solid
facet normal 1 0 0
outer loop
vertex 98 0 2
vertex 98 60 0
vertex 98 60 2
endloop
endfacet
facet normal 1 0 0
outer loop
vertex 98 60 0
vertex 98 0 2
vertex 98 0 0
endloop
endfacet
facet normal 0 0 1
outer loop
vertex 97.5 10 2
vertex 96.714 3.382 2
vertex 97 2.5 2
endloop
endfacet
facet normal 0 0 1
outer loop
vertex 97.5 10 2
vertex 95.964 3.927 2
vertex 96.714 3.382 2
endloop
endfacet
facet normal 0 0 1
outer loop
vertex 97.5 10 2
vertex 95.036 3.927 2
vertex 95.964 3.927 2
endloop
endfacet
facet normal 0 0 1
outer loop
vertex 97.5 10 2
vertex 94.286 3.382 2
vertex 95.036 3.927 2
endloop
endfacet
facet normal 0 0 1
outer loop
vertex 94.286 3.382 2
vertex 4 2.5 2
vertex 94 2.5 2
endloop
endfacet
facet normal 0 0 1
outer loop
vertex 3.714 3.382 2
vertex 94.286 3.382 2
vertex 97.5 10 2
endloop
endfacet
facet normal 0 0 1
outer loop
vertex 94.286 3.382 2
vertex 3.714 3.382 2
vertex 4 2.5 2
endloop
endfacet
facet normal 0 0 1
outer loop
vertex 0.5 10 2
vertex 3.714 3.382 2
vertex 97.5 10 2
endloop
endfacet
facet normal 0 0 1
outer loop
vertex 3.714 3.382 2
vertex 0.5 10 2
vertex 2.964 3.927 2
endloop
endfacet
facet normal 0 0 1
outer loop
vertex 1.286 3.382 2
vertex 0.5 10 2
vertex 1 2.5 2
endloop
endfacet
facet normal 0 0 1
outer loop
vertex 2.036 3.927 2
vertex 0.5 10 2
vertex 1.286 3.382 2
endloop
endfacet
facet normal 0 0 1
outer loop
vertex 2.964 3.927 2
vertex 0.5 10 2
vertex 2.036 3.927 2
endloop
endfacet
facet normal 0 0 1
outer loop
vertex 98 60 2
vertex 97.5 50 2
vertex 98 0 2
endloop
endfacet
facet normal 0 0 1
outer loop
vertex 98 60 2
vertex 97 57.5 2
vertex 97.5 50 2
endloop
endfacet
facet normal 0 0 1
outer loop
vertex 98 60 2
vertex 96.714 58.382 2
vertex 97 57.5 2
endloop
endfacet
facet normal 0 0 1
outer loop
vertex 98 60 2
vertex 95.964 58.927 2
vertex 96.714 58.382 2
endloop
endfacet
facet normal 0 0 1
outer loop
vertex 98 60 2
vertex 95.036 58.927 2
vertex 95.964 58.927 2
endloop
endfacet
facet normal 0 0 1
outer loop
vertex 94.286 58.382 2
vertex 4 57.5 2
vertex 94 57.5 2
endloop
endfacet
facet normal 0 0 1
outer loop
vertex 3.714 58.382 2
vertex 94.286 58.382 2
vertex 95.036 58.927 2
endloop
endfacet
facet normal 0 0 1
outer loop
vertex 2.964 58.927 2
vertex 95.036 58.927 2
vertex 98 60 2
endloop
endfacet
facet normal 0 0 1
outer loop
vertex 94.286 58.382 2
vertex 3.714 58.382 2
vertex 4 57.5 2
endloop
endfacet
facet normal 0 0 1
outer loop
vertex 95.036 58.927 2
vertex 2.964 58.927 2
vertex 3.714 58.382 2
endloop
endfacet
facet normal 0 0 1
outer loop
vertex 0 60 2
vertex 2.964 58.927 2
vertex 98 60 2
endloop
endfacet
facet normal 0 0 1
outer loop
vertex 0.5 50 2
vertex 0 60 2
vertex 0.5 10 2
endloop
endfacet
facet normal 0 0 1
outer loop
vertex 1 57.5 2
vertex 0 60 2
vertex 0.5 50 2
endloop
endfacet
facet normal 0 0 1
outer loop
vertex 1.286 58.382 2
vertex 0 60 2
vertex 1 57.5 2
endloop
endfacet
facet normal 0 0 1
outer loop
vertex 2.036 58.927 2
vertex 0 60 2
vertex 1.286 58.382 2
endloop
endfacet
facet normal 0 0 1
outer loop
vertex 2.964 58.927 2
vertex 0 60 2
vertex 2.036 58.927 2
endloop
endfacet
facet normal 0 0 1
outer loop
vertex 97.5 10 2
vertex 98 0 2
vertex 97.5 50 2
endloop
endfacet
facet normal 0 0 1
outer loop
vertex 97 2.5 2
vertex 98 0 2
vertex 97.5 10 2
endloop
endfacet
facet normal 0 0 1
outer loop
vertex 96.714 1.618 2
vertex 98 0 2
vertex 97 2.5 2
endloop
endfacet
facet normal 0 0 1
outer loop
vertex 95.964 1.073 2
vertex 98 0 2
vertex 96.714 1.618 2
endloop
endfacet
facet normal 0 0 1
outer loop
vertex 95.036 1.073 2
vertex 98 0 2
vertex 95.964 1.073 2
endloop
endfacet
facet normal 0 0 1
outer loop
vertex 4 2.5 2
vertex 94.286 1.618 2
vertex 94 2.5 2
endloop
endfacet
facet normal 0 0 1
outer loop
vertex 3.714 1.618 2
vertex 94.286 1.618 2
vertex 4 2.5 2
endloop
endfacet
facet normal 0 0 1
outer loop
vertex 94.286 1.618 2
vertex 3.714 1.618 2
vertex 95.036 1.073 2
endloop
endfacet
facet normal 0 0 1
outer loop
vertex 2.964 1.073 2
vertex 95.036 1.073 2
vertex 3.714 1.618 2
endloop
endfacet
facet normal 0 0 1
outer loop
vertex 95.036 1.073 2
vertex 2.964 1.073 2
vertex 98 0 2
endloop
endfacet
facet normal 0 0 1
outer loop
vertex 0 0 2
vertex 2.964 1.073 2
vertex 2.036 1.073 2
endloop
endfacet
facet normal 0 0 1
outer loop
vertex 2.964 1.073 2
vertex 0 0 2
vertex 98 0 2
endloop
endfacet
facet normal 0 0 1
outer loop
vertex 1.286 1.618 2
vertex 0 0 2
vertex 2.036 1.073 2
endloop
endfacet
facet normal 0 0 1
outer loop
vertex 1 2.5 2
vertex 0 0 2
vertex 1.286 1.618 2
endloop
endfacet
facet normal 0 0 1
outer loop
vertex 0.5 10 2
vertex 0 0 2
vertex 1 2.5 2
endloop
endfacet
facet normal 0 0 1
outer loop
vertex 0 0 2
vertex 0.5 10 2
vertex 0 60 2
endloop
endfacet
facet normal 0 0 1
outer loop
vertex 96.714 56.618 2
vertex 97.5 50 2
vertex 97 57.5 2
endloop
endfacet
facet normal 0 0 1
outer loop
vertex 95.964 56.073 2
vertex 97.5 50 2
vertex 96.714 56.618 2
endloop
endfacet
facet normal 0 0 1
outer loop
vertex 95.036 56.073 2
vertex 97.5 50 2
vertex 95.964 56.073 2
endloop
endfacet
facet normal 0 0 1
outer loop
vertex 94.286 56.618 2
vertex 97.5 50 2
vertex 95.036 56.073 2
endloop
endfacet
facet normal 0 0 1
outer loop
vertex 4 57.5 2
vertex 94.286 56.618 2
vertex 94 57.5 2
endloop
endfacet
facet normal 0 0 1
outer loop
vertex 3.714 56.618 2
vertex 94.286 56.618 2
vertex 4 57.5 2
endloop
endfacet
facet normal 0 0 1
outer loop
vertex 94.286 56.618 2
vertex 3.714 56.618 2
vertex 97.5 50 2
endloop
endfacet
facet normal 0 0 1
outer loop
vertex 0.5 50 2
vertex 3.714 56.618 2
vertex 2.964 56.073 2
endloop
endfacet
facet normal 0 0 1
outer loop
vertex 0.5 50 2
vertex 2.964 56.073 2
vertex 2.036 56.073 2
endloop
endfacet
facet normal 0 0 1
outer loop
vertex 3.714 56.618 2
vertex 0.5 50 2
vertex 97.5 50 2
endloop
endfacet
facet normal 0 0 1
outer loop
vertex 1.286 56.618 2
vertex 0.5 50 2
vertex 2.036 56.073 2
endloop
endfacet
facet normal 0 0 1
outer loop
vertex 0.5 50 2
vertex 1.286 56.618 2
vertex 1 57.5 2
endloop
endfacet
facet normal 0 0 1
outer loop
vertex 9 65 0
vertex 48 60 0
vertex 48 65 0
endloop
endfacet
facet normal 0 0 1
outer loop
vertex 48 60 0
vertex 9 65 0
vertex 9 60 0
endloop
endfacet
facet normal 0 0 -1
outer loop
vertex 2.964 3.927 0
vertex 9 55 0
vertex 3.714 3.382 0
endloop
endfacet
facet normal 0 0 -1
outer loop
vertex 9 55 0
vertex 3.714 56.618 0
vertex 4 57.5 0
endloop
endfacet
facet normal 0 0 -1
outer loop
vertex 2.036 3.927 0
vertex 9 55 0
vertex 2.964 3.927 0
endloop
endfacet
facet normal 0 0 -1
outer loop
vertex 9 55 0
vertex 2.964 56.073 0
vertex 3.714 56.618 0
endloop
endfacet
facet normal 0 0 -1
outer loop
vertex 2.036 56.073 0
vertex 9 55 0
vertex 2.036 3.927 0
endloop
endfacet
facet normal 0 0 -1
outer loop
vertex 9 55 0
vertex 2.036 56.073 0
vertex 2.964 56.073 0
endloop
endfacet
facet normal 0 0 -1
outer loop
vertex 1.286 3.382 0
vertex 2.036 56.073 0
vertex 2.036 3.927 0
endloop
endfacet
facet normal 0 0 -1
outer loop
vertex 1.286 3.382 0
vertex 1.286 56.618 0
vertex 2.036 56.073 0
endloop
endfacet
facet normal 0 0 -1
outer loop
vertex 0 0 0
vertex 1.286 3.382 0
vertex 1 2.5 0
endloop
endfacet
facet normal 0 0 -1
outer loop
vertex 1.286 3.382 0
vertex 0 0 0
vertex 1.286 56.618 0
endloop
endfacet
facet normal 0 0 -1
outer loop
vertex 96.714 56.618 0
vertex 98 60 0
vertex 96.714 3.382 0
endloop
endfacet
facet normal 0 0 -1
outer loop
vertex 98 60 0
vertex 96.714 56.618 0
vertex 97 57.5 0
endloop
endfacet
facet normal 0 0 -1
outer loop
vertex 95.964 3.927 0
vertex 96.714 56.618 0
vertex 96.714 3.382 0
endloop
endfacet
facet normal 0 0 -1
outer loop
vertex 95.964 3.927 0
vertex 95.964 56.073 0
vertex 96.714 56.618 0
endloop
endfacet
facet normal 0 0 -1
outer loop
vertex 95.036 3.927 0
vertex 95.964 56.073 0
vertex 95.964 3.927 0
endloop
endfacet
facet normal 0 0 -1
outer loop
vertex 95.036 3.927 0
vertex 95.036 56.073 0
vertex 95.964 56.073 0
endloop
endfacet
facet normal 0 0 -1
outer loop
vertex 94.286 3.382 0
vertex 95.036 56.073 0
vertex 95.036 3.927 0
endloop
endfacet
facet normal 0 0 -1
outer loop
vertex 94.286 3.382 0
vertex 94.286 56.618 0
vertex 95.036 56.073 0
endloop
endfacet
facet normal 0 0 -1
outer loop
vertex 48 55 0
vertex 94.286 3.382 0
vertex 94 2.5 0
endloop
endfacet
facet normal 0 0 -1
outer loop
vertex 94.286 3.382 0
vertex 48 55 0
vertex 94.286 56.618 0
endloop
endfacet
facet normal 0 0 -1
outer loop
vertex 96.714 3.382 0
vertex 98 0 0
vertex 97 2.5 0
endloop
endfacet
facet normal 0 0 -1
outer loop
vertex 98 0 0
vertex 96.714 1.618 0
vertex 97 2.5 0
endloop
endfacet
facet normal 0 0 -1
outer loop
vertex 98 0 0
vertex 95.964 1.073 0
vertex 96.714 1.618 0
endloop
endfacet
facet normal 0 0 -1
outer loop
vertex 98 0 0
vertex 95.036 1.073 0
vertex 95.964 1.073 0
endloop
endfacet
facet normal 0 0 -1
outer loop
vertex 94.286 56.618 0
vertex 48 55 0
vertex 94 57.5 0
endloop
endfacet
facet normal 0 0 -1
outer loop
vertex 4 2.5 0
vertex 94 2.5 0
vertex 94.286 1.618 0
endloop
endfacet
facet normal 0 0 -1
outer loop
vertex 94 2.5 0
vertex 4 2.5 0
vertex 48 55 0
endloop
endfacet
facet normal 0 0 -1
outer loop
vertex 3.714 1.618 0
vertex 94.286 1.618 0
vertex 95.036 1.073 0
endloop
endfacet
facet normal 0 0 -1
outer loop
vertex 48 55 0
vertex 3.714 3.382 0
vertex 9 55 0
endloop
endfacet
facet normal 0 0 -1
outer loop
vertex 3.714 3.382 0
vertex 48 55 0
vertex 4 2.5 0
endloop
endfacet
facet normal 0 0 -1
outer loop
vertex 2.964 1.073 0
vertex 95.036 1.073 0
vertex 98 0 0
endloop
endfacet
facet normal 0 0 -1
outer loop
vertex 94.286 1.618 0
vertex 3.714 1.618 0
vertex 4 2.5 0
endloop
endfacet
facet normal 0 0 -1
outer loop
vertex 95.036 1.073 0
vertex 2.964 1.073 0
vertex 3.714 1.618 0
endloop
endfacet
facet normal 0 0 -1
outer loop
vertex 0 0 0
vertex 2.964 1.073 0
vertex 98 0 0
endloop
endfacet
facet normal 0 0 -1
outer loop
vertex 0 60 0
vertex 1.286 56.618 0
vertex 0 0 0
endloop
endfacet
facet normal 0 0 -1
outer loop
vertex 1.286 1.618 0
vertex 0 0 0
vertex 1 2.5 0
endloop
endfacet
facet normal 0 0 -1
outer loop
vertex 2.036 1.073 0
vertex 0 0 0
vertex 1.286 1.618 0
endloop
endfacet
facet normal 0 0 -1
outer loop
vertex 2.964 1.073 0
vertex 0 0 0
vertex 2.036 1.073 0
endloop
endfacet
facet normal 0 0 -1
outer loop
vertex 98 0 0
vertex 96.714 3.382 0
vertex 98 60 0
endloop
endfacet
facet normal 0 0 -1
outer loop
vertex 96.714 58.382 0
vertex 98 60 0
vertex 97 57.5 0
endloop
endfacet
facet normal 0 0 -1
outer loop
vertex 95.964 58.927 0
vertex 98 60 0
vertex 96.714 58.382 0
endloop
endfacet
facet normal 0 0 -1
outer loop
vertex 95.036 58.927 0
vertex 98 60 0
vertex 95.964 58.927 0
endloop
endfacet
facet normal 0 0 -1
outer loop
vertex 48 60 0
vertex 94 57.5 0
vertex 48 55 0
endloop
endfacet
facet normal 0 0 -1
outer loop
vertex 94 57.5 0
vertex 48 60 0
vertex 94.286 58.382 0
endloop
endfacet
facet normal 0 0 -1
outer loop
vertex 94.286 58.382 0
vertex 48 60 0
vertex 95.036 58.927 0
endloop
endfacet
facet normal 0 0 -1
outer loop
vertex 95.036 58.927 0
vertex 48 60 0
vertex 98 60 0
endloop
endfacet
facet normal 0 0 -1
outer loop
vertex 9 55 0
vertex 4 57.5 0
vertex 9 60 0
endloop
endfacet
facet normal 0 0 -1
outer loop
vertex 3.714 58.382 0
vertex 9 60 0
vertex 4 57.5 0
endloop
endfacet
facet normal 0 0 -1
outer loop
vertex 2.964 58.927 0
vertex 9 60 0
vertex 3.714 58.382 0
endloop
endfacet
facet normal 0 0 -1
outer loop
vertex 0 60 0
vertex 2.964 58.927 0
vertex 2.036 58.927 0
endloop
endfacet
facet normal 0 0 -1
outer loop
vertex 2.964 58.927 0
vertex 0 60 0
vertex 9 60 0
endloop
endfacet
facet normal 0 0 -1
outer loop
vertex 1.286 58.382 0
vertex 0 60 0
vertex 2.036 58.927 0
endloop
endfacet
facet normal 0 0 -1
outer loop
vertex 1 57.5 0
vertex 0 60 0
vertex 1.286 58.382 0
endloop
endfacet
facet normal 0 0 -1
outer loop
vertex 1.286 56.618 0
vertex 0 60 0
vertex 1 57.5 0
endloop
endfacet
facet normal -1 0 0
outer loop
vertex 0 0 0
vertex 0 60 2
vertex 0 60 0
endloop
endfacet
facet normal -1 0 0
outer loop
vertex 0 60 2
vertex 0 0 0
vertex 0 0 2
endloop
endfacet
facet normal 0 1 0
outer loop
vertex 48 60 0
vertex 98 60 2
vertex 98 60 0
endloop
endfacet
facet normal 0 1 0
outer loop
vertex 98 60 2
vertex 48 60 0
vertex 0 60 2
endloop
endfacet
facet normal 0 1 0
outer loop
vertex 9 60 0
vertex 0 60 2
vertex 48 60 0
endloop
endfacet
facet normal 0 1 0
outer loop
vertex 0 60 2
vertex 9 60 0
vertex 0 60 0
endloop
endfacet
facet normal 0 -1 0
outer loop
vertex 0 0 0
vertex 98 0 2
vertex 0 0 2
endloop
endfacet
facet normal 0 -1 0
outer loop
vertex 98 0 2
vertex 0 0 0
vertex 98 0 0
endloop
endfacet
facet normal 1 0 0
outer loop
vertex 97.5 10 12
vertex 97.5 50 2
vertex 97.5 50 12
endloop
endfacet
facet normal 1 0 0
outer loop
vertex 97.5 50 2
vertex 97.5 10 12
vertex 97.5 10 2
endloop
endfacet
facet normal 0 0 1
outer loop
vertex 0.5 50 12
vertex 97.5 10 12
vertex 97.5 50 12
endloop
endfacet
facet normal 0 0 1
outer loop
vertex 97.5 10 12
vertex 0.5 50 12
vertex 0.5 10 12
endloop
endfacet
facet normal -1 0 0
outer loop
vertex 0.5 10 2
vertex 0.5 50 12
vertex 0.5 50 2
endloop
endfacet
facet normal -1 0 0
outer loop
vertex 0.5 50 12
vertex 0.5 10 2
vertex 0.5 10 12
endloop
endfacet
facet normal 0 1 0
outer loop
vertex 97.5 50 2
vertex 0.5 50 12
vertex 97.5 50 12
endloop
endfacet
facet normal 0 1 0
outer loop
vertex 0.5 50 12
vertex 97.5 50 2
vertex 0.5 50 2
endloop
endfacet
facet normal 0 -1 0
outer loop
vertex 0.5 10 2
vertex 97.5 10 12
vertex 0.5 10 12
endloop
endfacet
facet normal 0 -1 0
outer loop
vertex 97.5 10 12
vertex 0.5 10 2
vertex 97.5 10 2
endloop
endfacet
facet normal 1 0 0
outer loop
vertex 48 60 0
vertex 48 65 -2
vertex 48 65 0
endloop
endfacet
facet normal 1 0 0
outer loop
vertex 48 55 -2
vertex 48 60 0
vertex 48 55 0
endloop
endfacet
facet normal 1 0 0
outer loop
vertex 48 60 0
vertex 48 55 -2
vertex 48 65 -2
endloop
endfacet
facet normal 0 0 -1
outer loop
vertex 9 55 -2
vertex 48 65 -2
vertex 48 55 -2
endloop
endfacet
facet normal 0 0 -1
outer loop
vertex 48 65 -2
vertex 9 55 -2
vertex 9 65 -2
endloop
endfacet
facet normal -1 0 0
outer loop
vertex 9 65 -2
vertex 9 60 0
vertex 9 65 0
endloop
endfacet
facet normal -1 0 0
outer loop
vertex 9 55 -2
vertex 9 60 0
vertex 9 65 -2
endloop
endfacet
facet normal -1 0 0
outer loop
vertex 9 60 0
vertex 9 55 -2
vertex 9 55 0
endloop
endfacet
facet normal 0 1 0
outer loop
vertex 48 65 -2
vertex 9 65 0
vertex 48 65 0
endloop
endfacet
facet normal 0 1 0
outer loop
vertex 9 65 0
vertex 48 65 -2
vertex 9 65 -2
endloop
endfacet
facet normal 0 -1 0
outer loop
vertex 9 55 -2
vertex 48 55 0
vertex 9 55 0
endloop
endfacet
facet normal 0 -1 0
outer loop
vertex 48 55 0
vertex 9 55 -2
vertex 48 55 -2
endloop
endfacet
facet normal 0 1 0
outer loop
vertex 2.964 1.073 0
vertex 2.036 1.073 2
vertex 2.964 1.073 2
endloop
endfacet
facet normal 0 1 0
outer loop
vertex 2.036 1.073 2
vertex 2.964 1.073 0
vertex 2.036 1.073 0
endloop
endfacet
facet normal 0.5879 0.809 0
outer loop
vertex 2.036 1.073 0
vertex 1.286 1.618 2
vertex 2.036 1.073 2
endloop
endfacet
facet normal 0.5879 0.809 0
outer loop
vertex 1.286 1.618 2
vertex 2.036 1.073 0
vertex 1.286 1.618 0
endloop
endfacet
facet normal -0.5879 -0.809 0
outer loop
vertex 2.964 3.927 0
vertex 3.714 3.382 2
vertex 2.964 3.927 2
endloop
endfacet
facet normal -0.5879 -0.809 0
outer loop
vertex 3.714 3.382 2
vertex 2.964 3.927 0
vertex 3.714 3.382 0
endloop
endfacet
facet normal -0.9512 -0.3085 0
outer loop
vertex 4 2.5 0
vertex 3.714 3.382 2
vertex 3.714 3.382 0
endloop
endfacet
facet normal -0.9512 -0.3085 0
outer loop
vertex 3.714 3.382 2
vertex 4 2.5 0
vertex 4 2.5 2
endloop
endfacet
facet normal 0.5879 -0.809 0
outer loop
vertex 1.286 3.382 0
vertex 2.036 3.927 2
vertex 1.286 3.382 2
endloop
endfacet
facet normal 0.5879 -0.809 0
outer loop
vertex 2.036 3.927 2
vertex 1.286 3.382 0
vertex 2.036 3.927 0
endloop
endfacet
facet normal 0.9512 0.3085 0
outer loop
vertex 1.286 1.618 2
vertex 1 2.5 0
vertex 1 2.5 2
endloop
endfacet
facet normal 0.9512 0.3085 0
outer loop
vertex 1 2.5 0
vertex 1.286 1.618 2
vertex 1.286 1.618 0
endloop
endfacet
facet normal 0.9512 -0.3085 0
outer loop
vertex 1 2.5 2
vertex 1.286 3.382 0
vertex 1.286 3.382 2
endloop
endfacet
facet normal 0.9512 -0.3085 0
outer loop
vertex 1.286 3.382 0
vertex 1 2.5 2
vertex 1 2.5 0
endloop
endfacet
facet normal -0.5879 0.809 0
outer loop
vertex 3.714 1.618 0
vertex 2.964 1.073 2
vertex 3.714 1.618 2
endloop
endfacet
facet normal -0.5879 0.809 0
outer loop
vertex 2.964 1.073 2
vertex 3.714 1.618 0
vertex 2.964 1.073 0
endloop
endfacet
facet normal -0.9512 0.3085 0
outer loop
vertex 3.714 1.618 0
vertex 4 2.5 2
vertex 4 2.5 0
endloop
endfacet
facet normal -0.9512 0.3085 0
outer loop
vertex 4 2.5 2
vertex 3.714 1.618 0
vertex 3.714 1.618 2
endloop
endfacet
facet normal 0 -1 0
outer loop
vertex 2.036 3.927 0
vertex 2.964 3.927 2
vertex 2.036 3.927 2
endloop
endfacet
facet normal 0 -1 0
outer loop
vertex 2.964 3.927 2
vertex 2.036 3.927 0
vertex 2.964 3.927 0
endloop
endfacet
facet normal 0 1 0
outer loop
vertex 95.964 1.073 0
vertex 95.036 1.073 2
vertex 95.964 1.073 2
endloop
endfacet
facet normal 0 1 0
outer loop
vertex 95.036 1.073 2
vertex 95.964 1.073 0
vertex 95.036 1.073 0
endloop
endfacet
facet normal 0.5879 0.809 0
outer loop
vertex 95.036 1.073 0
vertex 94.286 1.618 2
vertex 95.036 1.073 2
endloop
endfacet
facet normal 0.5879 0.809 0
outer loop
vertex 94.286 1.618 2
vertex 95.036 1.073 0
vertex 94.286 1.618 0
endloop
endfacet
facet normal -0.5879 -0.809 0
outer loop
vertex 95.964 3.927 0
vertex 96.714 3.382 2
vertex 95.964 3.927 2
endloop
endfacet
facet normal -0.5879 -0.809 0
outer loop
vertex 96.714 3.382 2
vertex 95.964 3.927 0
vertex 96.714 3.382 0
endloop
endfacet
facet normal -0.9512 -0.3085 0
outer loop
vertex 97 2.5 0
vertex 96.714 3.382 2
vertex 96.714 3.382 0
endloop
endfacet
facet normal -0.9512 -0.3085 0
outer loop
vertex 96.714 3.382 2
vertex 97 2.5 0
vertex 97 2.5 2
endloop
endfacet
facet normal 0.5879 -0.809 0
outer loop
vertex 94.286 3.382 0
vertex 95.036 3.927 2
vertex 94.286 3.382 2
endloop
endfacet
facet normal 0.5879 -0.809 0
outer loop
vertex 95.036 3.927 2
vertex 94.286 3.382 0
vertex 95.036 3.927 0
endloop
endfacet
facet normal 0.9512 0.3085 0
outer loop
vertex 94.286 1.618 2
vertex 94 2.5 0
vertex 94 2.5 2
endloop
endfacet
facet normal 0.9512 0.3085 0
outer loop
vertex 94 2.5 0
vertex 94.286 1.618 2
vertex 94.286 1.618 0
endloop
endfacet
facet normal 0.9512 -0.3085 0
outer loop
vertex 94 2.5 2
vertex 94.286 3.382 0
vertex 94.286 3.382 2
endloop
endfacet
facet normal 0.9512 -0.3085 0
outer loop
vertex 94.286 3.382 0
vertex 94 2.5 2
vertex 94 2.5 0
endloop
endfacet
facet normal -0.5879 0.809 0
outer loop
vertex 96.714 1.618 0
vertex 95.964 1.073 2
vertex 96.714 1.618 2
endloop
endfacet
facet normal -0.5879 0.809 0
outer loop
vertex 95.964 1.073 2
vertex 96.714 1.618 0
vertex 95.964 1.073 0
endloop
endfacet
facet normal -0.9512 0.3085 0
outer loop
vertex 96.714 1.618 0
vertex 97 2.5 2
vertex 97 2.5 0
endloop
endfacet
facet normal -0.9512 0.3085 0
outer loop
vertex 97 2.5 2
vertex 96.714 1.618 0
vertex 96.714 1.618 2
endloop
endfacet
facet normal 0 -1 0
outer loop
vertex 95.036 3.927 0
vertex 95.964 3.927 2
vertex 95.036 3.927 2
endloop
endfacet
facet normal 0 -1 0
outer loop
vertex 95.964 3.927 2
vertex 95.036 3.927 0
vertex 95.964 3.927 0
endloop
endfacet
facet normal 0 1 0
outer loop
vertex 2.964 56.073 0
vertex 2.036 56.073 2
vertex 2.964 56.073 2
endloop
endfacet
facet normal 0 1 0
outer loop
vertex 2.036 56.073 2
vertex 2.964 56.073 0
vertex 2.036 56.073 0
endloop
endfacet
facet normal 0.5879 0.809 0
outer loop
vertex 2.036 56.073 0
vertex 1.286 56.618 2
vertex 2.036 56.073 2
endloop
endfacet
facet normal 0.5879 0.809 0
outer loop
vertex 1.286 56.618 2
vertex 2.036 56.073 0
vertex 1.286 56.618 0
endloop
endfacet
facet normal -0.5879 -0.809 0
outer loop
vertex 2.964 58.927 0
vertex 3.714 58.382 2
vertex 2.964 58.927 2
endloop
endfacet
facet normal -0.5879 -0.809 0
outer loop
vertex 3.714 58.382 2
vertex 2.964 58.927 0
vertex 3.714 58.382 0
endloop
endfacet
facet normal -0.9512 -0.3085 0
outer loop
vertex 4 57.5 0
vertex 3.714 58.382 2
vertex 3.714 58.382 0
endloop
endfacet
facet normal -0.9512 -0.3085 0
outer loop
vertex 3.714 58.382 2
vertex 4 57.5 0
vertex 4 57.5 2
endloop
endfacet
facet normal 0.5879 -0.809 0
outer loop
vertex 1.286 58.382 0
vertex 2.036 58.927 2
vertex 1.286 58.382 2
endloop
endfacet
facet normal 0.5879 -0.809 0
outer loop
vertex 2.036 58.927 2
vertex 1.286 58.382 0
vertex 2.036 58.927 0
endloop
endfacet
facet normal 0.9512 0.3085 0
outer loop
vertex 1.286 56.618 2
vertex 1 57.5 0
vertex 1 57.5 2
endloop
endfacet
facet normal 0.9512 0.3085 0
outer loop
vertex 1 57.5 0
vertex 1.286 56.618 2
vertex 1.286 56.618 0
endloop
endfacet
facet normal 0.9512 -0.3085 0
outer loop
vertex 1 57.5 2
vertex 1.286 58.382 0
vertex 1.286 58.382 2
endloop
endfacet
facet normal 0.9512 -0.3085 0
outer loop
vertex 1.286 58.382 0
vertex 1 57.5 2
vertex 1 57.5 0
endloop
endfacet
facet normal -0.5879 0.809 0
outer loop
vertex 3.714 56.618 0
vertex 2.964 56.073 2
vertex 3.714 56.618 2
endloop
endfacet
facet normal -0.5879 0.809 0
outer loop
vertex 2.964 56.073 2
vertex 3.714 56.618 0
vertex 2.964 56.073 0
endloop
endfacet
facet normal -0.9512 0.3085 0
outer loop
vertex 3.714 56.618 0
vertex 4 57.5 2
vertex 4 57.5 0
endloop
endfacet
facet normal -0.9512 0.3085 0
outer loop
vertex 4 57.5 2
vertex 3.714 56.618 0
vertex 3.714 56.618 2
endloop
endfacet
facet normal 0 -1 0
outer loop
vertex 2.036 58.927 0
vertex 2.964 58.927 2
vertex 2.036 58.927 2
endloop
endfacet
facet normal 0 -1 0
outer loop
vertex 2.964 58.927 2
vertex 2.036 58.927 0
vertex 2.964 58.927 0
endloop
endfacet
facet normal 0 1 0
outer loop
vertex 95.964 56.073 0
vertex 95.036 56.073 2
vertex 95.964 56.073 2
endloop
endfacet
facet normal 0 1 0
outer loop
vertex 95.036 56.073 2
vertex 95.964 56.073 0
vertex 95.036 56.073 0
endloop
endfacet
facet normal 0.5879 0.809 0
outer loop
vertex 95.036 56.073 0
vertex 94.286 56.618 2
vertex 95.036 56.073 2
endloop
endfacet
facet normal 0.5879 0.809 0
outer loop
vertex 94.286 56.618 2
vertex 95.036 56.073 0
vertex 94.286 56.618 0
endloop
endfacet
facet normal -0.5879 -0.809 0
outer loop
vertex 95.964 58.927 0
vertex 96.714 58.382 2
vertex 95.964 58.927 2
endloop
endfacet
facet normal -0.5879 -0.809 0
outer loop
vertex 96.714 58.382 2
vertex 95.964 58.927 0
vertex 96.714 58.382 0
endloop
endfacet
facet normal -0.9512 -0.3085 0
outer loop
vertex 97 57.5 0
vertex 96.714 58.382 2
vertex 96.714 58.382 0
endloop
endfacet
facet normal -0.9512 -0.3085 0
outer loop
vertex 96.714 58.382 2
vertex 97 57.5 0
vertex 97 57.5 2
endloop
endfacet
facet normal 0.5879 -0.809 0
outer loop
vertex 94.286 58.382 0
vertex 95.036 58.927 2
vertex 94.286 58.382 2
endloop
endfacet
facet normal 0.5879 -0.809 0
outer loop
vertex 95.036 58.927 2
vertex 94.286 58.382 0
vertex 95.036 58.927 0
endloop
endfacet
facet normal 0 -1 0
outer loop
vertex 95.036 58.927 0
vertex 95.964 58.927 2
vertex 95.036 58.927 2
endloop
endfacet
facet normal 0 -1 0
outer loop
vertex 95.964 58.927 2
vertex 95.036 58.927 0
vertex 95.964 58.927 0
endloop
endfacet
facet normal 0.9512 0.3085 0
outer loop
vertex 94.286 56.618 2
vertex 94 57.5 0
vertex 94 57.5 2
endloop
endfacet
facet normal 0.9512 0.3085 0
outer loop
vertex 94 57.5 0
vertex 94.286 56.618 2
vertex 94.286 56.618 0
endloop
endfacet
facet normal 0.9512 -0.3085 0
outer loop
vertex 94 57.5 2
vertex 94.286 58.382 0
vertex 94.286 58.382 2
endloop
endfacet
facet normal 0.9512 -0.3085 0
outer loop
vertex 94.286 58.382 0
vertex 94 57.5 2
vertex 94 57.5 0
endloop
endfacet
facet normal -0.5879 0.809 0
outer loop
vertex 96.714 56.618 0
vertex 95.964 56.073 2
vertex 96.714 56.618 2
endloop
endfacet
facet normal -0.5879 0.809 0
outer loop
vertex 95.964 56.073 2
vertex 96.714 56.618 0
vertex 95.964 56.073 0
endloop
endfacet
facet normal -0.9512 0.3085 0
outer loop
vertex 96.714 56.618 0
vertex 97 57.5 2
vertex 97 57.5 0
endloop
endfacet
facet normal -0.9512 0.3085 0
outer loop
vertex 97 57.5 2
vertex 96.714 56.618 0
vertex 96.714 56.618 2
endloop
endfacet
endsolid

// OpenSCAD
module lcdBoard()
{
  difference()
  {
    union()
    {
      // lower plate
      cube([98,60,2]);
      // LCD itself
      translate([0.5, 10, 2])
        cube([97,40,10]);
      // cables
      translate([9, 60-5, -2])
        cube([39,10,2]);
    }
    // drills
    for(offset = [
                   [3/2+1, 3/2+1, -1],
                   [98-3/2-1, 3/2+1, -1],
                   [3/2+1, 60-3/2-1, -1],
                   [98-3/2-1, 60-3/2-1, -1]
                 ])
    {
      translate(offset)
        cylinder(r=3/2, h=4, $fs=1);
    }
  }
}

lcdBoard();
